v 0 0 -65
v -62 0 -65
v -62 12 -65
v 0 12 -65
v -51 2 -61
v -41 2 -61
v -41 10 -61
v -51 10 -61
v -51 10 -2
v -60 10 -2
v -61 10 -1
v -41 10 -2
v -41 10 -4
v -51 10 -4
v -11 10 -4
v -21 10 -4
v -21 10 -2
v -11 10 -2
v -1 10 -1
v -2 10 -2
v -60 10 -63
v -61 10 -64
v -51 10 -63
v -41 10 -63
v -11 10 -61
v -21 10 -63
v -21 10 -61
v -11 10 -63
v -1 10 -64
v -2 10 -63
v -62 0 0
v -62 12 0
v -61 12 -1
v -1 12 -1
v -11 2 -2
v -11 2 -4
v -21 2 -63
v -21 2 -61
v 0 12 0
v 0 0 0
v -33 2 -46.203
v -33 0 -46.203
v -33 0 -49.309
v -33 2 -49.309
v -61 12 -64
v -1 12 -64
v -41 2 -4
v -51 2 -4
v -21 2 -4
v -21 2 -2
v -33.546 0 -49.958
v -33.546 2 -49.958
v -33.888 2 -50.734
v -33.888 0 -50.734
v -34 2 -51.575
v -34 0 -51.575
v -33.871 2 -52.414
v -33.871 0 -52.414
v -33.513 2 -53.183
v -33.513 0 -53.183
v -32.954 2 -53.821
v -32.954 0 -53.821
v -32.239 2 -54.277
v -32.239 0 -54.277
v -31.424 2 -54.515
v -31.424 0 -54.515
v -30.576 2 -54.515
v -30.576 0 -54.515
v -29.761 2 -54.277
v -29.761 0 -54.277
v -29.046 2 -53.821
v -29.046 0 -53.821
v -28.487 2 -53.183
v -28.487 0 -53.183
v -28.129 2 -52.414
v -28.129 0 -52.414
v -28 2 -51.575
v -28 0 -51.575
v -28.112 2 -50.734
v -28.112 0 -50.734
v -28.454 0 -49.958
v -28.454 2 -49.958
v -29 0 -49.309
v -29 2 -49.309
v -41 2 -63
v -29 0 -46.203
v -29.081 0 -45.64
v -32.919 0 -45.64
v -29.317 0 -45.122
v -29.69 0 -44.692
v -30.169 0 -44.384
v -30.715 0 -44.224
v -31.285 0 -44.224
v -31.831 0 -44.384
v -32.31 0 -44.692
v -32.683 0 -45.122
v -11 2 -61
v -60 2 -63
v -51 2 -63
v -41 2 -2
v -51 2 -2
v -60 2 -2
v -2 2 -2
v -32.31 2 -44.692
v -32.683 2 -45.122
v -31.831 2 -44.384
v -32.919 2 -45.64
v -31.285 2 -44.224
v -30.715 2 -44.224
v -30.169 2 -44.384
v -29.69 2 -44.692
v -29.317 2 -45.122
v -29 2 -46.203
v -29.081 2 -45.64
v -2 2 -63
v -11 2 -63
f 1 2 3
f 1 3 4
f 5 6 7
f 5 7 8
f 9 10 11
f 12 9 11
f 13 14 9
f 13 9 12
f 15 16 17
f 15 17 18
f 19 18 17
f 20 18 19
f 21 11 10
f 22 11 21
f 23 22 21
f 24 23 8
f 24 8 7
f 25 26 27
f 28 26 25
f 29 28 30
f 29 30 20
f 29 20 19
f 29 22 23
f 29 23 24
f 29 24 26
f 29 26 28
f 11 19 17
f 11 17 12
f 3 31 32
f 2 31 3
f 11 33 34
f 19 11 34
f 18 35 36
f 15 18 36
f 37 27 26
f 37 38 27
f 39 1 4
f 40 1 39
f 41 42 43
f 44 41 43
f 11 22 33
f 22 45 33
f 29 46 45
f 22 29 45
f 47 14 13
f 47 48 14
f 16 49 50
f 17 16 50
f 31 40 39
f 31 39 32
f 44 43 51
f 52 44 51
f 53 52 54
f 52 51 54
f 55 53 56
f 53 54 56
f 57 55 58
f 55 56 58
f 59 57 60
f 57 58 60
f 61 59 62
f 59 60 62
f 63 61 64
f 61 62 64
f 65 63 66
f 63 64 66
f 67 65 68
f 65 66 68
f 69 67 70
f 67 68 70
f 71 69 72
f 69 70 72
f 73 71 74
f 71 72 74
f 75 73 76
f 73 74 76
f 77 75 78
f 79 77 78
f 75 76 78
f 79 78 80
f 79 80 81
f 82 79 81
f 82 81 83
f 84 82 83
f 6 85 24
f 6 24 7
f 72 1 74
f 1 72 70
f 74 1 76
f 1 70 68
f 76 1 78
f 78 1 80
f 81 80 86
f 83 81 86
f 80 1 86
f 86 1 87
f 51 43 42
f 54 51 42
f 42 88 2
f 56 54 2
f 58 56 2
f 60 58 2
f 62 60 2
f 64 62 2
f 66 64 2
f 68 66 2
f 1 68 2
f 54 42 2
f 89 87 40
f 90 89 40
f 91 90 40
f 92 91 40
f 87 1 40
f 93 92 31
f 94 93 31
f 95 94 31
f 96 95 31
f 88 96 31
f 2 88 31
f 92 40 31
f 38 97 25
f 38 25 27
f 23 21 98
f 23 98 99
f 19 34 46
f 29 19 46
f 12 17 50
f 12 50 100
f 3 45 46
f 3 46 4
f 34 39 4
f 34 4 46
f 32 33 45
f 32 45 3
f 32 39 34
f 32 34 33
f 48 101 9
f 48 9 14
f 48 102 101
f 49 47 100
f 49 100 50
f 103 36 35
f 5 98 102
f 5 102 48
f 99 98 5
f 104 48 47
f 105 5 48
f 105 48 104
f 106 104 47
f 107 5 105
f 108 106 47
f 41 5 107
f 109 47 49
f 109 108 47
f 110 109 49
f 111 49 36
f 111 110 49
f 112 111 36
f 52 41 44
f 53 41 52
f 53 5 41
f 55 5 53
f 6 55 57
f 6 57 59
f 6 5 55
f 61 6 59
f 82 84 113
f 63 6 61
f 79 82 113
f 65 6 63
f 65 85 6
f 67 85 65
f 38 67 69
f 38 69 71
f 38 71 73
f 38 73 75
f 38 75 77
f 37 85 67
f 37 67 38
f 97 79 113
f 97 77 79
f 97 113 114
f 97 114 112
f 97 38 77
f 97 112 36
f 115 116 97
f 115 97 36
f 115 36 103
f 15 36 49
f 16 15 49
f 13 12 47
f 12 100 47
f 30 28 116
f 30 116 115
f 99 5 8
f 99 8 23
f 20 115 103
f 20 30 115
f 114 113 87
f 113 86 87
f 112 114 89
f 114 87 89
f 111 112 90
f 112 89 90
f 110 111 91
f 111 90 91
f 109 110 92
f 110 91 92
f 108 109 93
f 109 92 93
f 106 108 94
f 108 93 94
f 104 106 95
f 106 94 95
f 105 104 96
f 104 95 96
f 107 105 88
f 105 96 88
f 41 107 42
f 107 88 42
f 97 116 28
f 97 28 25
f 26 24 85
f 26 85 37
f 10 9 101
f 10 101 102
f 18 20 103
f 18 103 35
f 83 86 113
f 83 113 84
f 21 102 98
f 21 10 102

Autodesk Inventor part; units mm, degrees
ref_plane "YZ Plane" through (0, 0, 0) normal (1, 0, 0) x (0, 1, 0)
ref_plane "XZ Plane" through (0, 0, 0) normal (0, 1, 0) x (-1, 0, 0)
ref_plane "XY Plane" through (0, 0, 0) normal (0, 0, 1) x (1, 0, 0)
sketch "Sketch1" plane through (0, 0, 0) normal (0, 1, 0) x (-1, 0, 0)
  point P0 (0, 0)
sketch "Sketch2" plane through (0, 0, 0) normal (0, 1, 0) x (-1, 0, 0)
  line L0 (0, 0) -> (62, 0)
  line L1 (62, 0) -> (62, -65)
  line L2 (62, -65) -> (0, -65)
  line L3 (0, -65) -> (0, 0)
  dimension "d0" = 62
  dimension "d1" = 65
extrude "Extrusion1" add sketch "Sketch2" along normal blind 12
sketch "Sketch3" plane through (0, 12, 0) normal (0, 1, 0) x (1, 0, 0)
  point P0 (0, 0)
sketch "Sketch4" plane through (0, 12, 0) normal (0, 1, 0) x (1, 0, 0)
  line L0 (0, 65) -> (-62, 65) projected
  line L1 (-30.4814, 65) -> (-28.4814, 65)
  line L2 (-28.4814, 65) -> (-28.4814, 63)
  line L3 (-62, 65) -> (-62, 0) projected
  line L4 (-62, 36.8423) -> (-62, 38.8423)
  line L5 (-62, 38.8423) -> (-60, 38.8423)
  line L6 (-62, 0) -> (0, 0) projected
  line L7 (-28.4814, 0) -> (-30.4814, 0)
  line L8 (-30.4814, 0) -> (-30.4814, 2)
  line L9 (0, 0) -> (0, 65) projected
  line L10 (0, 38.8423) -> (0, 36.8423)
  line L11 (0, 36.8423) -> (-2, 36.8423)
  line L12 (-60, 63) -> (-2, 63)
  line L13 (-2, 63) -> (-2, 2)
  line L14 (-2, 2) -> (-60, 2)
  line L15 (-60, 2) -> (-60, 63)
  dimension "d5" = 2
  dimension "d6" = 2
  dimension "d7" = 2
  dimension "d8" = 2
  dimension "d9" = 2
  dimension "d10" = 2
  dimension "d11" = 2
  dimension "d12" = 2
extrude "Extrusion2" cut sketch "Sketch4" against normal blind 10 contours L12 L13 L14 L15
sketch "Sketch10" plane through (0, 2, 0) normal (0, 1, 0) x (1, 0, 0)
  line L0 (-2, 2) -> (-60, 2) projected
  line L1 (-31, 2) -> (-41, 2)
  line L2 (-41, 2) -> (-41, 4)
  line L3 (-41, 2) -> (-51, 2)
  line L4 (-51, 2) -> (-51, 4)
  line L5 (-51, 4) -> (-41, 4)
  line L6 (-41, 4) -> (-41, 2)
  line L7 (-60, 63) -> (-2, 63) projected
  line L8 (-51, 63) -> (-41, 63)
  line L9 (-41, 63) -> (-41, 61)
  line L10 (-41, 61) -> (-51, 61)
  line L11 (-51, 61) -> (-51, 63)
  line L12 (-60, 2) -> (-60, 63) projected
  line L13 (-21, 63) -> (-11, 63)
  line L14 (-11, 63) -> (-11, 61)
  line L15 (-11, 61) -> (-21, 61)
  line L16 (-21, 61) -> (-21, 63)
  line L17 (-21, 2) -> (-11, 2)
  line L18 (-11, 2) -> (-11, 4)
  line L19 (-11, 4) -> (-21, 4)
  line L20 (-21, 4) -> (-21, 2)
  line L21 (-2, 63) -> (-2, 2) projected
  point P0 (0, 0)
  dimension "d55" = 2
  dimension "d56" = 10
  dimension "d57" = 10
  dimension "d58" = 2
  dimension "d59" = 9
  dimension "d60" = 10
  dimension "d61" = 10
  dimension "d62" = 9
  dimension "d63" = 9
extrude "Extrusion5" add sketch "Sketch10" along normal blind 9 contours L0 L20 L19 L18 | L14 L15 L16 L7 | L0 L4 L5 L2 | L9 L10 L11 L7
sketch "Sketch12" plane through (0, 0, 0) normal (0, -1, 0) x (1, 0, 0)
  line L0 (0, 0) -> (0, -65) projected
  arc A0 (-33, -49.3087) -> (-29, -49.3087) centre (-31, -51.5448) ccw
  arc A1 (-29, -46.2034) -> (-33, -46.2034) centre (-31, -46.2034) ccw
  line L1 (-29, -46.2034) -> (-29, -49.3087)
  line L2 (-33, -46.2034) -> (-33, -49.3087)
extrude "Extrusion7" cut sketch "Sketch12" against normal blind 10
sketch "Sketch13" plane through (0, 12, 0) normal (0, 1, 0) x (1, 0, 0)
  line L0 (-60, 2) -> (-60, 63) projected
  line L1 (-60, 4.6965) -> (-61, 4.6965)
  line L2 (-62, 65) -> (-62, 0) projected
  line L3 (-55.851, 2) -> (-55.851, 1)
  line L4 (-2, 63) -> (-2, 2) projected
  line L5 (-2, 53.5974) -> (-2, 54.5974)
  line L6 (-2, 54.5974) -> (-1, 54.5974)
  line L7 (0, 0) -> (0, 65) projected
  line L8 (-60, 63) -> (-2, 63) projected
  line L9 (-54.9589, 63) -> (-55.9589, 63)
  line L10 (-55.9589, 63) -> (-56.9589, 63)
  line L11 (-56.9589, 63) -> (-56.9589, 64)
  line L12 (-61, 1) -> (-1, 1)
  line L13 (-1, 1) -> (-1, 64)
  line L14 (-1, 64) -> (-61, 64)
  line L15 (-61, 64) -> (-61, 1)
  dimension "d81" = 1
  dimension "d82" = 1
  dimension "d83" = 1
  dimension "d84" = 1
  dimension "d85" = 1
  dimension "d86" = 1
  dimension "d87" = 1
extrude "Extrusion8" cut sketch "Sketch13" against normal blind 2
properties part number "Shell 1"
